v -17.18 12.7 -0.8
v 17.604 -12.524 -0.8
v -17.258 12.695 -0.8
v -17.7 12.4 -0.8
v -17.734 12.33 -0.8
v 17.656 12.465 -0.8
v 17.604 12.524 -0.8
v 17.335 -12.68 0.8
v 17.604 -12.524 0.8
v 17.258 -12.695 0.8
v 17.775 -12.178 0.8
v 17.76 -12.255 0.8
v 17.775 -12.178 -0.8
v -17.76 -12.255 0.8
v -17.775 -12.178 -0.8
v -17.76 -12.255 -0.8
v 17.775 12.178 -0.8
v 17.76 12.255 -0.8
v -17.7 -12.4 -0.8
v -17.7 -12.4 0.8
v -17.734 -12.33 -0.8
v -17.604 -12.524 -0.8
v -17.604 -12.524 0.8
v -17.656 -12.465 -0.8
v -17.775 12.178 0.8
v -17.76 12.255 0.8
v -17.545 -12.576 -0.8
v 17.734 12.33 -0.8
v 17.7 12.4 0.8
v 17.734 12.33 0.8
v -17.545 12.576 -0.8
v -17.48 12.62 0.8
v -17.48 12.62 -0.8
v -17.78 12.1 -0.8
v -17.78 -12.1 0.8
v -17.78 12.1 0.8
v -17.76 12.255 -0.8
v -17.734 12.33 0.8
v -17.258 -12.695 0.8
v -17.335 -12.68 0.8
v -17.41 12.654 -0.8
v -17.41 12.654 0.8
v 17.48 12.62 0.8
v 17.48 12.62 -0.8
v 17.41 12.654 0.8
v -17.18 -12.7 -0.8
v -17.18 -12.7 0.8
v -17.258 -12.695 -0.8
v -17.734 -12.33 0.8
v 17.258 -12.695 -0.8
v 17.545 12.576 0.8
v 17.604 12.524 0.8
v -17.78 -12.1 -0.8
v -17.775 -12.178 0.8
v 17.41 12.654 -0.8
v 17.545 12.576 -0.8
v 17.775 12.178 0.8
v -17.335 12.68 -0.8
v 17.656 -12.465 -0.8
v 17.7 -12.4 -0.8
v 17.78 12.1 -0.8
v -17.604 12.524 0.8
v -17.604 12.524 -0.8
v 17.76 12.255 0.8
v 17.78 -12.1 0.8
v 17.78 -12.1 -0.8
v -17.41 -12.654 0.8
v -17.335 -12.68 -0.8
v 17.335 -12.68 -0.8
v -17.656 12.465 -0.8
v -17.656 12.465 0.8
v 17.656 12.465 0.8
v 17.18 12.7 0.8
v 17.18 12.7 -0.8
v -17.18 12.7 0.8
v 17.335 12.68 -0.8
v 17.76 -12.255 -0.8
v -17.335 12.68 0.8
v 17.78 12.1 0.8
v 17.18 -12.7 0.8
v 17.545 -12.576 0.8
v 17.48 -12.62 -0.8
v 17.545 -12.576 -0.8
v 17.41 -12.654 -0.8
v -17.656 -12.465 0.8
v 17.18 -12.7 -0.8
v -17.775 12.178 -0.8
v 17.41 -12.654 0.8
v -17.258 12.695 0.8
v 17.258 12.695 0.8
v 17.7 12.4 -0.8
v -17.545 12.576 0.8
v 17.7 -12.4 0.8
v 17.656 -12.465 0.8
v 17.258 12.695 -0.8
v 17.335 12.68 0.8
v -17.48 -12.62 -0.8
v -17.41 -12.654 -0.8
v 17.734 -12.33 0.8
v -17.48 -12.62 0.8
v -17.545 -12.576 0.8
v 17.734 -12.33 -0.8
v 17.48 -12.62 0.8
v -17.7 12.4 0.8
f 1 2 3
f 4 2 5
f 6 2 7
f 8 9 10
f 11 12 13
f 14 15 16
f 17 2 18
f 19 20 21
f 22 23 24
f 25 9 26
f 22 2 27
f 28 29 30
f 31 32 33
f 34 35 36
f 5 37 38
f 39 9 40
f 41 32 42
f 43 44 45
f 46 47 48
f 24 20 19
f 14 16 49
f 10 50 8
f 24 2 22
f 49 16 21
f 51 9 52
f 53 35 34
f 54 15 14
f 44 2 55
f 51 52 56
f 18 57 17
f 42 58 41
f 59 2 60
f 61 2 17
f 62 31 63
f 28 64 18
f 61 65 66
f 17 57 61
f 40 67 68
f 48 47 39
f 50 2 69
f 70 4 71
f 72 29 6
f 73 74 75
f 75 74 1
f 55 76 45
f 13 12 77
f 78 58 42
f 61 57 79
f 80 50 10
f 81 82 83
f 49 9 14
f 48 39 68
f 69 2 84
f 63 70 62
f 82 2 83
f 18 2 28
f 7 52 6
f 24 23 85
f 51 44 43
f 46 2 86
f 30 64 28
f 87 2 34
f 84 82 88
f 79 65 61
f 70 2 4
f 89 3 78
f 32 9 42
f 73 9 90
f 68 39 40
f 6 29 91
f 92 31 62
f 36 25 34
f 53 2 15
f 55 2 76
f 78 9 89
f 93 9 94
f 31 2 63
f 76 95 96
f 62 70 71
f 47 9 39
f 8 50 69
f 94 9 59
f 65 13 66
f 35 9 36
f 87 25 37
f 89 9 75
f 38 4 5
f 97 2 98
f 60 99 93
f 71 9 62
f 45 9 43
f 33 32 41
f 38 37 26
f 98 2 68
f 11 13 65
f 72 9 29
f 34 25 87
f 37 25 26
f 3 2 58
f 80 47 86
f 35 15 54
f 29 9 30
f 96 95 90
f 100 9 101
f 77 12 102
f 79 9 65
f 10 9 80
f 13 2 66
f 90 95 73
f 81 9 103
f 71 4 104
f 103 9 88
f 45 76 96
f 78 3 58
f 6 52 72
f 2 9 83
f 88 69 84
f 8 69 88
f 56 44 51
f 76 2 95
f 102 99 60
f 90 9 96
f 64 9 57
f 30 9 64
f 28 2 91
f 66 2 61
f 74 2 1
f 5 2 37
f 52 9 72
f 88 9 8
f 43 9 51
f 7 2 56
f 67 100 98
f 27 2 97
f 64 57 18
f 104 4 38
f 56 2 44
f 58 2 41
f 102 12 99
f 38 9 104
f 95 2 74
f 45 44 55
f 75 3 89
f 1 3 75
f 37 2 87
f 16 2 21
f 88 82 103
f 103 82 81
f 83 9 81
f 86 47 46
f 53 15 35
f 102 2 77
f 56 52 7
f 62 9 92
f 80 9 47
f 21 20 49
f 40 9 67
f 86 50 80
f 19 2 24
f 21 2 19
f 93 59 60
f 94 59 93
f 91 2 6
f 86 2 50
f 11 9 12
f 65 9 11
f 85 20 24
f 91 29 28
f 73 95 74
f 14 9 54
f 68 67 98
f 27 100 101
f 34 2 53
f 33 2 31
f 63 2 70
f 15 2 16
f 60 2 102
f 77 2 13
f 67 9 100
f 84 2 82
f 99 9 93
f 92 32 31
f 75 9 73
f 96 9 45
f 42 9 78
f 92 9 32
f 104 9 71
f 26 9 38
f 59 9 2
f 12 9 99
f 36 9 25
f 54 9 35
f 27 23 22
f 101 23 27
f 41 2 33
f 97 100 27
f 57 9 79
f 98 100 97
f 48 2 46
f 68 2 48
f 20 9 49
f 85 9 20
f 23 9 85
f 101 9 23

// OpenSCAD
// PCB parameters (mm)
pcb_length    = 35.56;
pcb_width     = 25.4;
pcb_thickness = 1.6;

// Small edge bevel to look more like a PCB while keeping exact overall size
edge_bevel = min(0.6, pcb_thickness/2);

// PCB module (single connected solid)
module pcb(len=pcb_length, wid=pcb_width, th=pcb_thickness, b=edge_bevel) {
    color([0.0, 0.4, 0.2])
    hull() {
        // 4 corner posts, inset by bevel amount; hull creates beveled sides
        for (sx = [-1, 1], sy = [-1, 1]) {
            translate([sx*(len/2 - b), sy*(wid/2 - b), 0])
                cylinder(h=th, r=b, center=true, $fn=48);
        }
    }
}

// Final output
pcb();
